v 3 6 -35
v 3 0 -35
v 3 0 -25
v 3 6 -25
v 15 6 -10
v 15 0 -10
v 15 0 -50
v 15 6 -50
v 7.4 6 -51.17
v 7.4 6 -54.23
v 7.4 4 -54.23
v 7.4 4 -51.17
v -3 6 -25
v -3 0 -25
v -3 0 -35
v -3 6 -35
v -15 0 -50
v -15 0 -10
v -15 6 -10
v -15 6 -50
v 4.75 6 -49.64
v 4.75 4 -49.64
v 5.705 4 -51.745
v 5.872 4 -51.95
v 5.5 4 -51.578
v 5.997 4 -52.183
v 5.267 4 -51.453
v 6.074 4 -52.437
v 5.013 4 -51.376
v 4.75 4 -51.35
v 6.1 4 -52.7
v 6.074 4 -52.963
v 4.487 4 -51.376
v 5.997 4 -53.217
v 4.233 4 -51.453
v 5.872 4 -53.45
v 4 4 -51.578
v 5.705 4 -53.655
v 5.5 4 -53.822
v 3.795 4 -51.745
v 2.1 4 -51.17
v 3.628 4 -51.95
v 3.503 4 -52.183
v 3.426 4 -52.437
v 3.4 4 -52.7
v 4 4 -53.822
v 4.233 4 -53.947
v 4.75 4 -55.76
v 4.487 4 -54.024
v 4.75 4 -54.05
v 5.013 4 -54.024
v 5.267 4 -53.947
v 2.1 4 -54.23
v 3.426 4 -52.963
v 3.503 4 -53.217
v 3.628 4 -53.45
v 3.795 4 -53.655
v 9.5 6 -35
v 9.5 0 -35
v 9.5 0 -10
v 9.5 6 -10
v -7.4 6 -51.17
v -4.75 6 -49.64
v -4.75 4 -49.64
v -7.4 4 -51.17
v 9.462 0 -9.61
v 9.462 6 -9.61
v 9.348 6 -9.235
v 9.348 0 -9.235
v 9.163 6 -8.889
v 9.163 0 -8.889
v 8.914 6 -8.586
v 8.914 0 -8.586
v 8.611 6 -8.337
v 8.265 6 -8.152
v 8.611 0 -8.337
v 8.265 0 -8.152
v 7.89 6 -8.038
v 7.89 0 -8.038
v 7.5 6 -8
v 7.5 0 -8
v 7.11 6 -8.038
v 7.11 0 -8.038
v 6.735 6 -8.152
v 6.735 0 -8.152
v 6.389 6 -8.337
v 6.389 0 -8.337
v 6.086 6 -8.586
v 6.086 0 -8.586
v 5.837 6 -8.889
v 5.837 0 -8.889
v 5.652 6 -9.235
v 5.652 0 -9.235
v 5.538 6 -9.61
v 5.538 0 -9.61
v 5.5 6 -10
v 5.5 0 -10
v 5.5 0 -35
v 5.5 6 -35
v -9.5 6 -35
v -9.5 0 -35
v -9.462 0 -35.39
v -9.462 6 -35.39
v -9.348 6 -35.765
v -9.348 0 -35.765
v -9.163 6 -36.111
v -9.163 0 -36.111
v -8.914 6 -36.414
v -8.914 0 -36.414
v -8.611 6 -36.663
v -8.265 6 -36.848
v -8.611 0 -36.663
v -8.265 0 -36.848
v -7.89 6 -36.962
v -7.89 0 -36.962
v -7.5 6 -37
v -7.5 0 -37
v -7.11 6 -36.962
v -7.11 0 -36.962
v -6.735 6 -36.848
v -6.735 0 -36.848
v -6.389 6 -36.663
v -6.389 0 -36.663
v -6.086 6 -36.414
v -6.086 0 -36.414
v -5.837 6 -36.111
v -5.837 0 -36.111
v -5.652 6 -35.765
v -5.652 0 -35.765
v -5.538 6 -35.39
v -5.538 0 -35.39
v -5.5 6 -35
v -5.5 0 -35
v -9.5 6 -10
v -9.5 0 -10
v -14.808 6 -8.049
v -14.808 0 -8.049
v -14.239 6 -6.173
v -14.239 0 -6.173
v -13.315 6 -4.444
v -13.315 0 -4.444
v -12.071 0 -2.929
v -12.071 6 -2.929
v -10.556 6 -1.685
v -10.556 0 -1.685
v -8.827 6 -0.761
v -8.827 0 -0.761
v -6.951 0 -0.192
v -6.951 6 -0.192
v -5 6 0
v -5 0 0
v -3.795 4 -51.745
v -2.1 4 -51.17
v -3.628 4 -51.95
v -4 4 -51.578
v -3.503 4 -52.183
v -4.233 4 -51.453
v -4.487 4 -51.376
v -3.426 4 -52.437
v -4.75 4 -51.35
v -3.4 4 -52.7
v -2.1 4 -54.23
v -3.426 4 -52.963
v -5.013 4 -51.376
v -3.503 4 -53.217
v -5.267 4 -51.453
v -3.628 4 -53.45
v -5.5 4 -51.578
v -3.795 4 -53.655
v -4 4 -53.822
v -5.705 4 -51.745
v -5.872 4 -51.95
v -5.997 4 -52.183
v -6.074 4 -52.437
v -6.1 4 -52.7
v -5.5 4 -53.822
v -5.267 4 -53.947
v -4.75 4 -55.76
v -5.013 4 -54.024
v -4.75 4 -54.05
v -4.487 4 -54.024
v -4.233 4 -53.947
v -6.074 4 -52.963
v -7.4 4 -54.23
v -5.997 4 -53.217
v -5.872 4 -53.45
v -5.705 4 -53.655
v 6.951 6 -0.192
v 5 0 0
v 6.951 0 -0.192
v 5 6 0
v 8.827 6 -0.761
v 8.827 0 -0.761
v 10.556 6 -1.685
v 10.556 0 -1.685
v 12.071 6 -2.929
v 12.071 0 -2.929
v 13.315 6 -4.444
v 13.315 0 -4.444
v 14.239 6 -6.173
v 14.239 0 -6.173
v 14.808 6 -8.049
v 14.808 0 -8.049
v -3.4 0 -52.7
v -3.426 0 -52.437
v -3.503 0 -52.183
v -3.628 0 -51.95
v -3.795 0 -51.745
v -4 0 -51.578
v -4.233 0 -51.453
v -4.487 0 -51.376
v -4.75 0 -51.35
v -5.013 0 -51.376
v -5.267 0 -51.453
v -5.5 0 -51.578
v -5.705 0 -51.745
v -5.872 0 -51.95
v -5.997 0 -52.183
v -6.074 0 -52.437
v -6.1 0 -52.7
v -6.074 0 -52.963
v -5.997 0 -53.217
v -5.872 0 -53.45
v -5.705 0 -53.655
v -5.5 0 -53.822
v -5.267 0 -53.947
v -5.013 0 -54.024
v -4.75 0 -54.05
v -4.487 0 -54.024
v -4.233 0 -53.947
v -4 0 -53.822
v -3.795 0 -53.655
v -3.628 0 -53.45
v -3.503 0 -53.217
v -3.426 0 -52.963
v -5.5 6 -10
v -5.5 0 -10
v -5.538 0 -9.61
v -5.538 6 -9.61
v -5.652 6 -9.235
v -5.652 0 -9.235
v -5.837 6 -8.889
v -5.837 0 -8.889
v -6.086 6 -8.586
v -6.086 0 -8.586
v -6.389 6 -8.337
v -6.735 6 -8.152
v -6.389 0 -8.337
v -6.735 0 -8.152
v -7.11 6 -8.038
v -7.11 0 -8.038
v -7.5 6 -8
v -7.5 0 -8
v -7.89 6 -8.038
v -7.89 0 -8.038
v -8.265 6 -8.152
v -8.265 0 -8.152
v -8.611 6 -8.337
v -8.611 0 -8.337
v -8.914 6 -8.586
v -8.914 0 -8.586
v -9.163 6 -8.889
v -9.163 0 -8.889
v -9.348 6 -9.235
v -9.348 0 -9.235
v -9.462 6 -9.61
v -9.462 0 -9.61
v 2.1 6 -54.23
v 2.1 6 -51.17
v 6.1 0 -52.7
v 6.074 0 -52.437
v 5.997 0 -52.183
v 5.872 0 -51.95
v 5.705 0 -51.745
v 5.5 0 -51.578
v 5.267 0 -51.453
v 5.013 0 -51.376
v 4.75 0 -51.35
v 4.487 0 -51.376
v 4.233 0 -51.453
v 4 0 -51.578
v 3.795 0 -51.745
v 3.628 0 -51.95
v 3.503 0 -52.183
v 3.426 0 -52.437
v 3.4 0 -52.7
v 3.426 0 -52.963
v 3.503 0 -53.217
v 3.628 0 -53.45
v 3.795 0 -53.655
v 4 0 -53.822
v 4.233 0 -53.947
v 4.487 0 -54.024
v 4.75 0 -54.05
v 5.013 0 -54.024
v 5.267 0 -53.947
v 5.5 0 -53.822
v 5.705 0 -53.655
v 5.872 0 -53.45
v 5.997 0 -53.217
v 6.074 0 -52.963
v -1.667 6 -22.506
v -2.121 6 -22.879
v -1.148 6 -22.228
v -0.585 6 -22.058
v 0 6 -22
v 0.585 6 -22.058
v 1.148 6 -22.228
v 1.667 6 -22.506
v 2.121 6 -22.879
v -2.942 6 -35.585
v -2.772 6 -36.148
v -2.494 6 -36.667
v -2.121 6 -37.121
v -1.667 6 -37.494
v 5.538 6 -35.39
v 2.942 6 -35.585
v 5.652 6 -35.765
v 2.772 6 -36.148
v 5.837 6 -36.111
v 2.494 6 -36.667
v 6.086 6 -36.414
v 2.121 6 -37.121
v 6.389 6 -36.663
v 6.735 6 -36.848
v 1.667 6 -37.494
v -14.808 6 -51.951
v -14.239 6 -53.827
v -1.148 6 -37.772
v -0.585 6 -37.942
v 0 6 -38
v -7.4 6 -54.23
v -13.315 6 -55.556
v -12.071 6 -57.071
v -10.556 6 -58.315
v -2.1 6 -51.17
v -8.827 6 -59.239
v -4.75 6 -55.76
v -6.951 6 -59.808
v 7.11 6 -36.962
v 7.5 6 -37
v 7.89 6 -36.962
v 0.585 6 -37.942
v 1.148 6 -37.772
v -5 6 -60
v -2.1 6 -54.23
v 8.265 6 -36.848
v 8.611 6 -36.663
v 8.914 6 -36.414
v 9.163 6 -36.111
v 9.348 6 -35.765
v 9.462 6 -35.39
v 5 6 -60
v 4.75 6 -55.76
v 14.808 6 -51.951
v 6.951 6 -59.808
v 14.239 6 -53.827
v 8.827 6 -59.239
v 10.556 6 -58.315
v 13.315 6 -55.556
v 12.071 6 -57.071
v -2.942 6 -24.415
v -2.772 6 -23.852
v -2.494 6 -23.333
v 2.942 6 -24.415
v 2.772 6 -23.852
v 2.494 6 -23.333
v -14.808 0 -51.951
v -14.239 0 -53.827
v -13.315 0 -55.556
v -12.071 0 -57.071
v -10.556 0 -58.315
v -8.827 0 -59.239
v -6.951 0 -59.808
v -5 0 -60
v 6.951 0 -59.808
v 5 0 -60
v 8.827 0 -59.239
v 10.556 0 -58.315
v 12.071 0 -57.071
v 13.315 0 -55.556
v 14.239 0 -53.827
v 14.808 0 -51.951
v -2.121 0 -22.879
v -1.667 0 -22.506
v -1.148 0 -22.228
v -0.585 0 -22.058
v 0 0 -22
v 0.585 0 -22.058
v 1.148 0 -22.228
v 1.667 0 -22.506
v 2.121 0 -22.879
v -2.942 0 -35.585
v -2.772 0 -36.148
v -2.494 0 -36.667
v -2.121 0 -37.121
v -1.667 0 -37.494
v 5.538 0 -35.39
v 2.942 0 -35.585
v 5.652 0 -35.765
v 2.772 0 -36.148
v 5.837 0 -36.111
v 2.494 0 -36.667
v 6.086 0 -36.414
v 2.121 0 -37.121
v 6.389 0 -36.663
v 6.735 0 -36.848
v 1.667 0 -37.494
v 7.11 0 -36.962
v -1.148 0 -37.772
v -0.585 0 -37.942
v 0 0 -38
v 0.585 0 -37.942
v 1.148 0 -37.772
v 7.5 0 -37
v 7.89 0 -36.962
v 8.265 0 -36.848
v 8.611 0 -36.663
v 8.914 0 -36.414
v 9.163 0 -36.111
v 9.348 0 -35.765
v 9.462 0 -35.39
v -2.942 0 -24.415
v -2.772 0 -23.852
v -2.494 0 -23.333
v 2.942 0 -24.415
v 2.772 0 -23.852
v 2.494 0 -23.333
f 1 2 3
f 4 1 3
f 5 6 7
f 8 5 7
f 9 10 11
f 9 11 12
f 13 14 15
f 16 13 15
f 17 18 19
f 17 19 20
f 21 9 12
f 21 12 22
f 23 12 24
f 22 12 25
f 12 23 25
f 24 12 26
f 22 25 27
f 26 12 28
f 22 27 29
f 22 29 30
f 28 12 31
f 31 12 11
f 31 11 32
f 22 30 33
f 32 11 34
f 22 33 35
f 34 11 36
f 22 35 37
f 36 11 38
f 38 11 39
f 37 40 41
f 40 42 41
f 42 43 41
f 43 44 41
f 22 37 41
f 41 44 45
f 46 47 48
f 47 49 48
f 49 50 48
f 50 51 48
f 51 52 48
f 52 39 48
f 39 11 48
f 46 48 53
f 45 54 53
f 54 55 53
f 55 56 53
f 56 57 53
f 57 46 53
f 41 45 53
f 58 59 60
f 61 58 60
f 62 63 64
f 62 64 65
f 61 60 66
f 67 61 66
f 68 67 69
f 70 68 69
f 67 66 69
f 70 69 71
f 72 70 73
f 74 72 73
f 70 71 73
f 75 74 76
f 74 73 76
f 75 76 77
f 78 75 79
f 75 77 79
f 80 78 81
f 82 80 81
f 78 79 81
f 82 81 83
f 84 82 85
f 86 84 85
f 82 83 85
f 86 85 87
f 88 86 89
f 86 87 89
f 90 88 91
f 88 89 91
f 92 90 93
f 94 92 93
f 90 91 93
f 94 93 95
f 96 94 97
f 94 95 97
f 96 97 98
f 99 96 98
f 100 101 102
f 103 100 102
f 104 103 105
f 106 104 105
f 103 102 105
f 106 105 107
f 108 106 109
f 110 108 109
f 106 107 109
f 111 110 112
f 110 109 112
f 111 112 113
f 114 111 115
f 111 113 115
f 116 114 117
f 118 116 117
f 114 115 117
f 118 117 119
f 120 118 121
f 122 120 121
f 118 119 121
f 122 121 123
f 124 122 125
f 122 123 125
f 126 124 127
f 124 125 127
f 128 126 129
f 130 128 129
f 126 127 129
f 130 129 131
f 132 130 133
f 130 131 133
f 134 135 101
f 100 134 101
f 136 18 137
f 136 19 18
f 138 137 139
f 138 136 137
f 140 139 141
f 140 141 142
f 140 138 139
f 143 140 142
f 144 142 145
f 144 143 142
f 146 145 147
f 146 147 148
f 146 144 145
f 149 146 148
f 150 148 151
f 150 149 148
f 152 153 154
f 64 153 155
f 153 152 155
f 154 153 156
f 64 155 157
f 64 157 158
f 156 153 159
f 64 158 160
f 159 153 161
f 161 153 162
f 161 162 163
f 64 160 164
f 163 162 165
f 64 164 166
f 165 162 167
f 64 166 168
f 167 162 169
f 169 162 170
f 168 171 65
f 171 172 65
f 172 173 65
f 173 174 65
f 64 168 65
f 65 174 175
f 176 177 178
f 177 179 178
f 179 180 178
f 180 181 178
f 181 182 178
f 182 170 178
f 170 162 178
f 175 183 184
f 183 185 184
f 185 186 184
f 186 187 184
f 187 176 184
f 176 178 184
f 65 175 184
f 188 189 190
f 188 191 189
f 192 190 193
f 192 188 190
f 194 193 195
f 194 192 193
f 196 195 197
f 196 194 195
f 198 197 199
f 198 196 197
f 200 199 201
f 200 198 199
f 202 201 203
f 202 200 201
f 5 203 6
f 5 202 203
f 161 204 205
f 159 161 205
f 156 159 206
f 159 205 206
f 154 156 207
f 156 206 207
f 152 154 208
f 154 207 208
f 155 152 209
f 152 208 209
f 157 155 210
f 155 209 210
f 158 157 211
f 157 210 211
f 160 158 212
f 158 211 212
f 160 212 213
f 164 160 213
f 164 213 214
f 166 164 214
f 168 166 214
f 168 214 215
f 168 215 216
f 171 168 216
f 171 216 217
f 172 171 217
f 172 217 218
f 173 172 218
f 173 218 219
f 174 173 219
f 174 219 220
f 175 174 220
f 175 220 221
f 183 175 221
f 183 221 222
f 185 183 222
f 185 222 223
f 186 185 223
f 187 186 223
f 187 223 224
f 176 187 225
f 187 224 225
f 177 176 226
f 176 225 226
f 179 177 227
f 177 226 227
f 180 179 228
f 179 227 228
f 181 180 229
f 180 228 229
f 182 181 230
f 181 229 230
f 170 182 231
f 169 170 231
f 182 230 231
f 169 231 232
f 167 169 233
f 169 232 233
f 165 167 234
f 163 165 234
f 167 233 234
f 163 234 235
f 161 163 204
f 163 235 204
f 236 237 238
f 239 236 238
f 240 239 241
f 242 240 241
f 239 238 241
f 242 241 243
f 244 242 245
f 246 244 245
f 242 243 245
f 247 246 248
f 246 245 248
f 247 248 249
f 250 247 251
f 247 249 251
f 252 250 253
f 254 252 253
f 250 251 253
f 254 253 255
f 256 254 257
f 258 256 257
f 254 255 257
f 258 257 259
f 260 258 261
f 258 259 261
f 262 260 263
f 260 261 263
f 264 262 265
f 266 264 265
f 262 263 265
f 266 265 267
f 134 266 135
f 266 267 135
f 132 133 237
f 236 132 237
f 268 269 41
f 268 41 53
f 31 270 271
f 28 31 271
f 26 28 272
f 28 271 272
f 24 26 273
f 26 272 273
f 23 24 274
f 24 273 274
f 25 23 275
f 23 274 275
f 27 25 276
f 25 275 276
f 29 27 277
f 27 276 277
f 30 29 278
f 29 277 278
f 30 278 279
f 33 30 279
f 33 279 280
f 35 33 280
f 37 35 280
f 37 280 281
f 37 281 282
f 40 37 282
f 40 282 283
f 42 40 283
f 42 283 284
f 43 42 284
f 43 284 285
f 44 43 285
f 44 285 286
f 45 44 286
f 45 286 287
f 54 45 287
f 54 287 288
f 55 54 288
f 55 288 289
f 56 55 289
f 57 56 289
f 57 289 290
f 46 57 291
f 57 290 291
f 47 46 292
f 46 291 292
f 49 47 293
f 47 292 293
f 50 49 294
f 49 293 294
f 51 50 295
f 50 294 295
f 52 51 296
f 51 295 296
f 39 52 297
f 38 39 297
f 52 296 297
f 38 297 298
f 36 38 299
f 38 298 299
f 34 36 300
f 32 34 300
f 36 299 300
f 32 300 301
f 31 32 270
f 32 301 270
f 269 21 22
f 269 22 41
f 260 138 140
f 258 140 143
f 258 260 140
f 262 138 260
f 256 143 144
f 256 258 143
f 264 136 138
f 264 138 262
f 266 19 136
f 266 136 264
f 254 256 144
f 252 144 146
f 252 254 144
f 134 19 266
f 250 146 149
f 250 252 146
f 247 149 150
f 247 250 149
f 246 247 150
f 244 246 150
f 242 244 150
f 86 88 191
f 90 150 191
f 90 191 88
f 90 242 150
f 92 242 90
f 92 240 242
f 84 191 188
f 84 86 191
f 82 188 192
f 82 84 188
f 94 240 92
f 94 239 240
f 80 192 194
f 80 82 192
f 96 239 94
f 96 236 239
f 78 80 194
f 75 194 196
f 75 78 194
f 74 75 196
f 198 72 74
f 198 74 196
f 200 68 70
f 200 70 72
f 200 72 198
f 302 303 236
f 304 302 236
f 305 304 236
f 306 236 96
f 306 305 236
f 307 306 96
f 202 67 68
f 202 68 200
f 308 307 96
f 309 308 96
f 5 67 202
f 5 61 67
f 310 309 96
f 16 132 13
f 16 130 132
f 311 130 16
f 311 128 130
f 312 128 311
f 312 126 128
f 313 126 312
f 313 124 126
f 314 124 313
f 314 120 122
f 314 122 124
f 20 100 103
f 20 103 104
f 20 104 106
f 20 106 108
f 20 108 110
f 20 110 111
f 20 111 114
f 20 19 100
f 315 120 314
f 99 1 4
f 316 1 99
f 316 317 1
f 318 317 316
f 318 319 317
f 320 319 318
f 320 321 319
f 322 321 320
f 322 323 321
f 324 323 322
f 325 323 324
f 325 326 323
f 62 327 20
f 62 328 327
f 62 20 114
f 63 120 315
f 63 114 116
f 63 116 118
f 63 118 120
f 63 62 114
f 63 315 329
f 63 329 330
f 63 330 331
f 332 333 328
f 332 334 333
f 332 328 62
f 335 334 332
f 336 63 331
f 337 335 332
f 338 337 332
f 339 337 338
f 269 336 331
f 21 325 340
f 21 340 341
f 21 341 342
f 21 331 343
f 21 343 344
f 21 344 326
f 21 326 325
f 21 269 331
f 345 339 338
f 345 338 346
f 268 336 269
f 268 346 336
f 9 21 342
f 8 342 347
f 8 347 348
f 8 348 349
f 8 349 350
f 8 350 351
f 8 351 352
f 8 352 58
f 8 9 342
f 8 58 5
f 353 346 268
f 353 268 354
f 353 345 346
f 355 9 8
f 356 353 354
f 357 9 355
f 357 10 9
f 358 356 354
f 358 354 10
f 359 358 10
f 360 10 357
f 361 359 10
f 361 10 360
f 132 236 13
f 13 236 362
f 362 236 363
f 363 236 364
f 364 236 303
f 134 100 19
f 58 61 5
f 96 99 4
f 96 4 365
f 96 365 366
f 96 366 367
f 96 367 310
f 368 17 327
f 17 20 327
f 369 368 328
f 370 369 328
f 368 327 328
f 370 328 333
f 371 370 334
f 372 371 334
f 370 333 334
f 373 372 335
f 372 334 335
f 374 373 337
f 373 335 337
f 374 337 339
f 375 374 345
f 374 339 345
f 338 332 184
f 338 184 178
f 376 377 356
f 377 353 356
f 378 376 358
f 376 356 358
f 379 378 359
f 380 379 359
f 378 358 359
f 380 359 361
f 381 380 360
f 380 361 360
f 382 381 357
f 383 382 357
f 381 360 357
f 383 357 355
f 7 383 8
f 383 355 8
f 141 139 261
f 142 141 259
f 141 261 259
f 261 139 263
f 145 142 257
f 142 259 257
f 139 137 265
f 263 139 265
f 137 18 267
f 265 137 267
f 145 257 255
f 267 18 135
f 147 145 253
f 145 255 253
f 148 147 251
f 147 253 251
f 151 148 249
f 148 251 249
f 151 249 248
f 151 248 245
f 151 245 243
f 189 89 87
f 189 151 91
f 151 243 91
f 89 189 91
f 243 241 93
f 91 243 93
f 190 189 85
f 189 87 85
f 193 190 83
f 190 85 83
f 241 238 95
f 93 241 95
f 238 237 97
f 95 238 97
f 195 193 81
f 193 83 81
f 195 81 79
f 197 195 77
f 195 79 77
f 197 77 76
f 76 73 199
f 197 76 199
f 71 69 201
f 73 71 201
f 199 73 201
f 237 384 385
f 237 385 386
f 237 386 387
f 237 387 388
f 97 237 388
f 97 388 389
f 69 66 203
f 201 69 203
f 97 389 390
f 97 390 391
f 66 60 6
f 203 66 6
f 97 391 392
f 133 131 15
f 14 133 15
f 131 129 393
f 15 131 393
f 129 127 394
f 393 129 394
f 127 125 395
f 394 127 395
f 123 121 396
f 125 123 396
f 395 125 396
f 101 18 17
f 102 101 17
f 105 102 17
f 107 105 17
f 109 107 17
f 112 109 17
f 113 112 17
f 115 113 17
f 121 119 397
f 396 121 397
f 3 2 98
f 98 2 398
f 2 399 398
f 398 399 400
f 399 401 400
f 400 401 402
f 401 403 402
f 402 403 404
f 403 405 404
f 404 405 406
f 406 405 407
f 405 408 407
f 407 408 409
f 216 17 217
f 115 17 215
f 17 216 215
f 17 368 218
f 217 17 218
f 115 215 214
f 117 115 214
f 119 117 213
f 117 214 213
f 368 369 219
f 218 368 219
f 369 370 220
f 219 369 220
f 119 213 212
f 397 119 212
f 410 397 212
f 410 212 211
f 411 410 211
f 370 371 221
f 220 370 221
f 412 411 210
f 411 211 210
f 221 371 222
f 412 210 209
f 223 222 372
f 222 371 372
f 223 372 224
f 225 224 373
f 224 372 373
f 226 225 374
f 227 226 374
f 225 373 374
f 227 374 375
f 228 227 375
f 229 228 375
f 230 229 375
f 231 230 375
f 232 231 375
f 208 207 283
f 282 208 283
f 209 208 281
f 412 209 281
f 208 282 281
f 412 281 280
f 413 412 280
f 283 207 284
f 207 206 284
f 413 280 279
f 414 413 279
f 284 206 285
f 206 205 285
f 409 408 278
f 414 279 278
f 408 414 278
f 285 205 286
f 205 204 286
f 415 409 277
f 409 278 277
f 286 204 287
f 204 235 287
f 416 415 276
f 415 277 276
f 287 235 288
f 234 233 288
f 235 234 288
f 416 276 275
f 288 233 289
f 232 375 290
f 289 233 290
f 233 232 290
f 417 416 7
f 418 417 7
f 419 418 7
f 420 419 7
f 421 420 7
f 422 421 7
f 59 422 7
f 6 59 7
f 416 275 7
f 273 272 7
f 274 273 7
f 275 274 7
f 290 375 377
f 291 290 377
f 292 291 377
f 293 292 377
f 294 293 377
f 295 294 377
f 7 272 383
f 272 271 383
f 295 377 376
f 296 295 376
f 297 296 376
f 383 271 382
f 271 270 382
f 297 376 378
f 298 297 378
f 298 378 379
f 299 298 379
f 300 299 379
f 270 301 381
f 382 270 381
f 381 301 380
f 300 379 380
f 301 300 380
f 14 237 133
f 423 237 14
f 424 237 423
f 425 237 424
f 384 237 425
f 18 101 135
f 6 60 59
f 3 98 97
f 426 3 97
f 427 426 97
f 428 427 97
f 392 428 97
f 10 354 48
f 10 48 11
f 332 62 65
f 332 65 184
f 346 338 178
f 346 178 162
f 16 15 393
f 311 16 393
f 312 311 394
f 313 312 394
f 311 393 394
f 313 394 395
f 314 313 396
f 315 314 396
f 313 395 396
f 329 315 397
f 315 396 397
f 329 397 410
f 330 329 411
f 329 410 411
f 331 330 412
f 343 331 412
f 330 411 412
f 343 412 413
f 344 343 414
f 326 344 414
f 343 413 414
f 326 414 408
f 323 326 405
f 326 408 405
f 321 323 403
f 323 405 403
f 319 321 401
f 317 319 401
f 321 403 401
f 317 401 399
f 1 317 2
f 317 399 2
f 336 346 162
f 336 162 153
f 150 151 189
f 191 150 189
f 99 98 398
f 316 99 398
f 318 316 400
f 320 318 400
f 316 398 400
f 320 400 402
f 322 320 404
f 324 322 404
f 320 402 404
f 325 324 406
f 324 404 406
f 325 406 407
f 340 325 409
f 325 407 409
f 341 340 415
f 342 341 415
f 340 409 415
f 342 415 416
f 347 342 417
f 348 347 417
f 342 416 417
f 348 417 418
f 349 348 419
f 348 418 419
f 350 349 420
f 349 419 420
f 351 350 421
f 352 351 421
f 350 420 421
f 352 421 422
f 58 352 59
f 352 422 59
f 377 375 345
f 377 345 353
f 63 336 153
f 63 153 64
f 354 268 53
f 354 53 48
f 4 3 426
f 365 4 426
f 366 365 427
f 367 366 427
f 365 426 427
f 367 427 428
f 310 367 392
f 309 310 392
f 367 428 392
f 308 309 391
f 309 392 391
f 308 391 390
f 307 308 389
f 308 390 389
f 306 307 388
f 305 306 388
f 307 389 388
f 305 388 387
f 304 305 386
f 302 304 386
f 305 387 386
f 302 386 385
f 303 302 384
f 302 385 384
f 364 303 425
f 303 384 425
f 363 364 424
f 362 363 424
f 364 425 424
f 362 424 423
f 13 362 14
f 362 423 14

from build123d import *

# Parameters (mm, degrees)
CROQUIS2_W              = 30
CROQUIS2_H              = 60
SALIENTE_EXTRUIR1_DEPTH = 6
REDONDEO1_R             = 10
REDONDEO2_R             = 10
CROQUIS3_R              = 1.35
CORTAR_EXTRUIR1_DEPTH   = 7
CORTAR_EXTRUIR2_DEPTH   = 2


with BuildPart() as part:
    # Croquis2 → Saliente-Extruir1 (new body)
    with BuildSketch(Plane(origin=(0, 0, 0), x_dir=(1, 0, 0), z_dir=(0, 1, 0))):
        with Locations((0, 30)):
            Rectangle(CROQUIS2_W, CROQUIS2_H)
        with BuildLine():
            Line((-5.5, 35), (-5.5, 10))
            ThreePointArc((-5.5, 10), (-7.5, 8), (-9.5, 10))
            Line((-9.5, 10), (-9.5, 35))
            ThreePointArc((-9.5, 35), (-7.5, 37), (-5.5, 35))
        make_face(mode=Mode.SUBTRACT)
        with BuildLine():
            Line((9.5, 35), (9.5, 10))
            ThreePointArc((9.5, 10), (7.5, 8), (5.5, 10))
            Line((5.5, 10), (5.5, 35))
            ThreePointArc((5.5, 35), (7.5, 37), (9.5, 35))
        make_face(mode=Mode.SUBTRACT)
        with BuildLine():
            Line((3, 35), (3, 25))
            ThreePointArc((3, 25), (0, 22), (-3, 25))
            Line((-3, 25), (-3, 35))
            ThreePointArc((-3, 35), (0, 38), (3, 35))
        make_face(mode=Mode.SUBTRACT)
    extrude(amount=SALIENTE_EXTRUIR1_DEPTH)

    # Redondeo1
    redondeo1_edges = [part.edges().sort_by_distance(p)[0] for p in [
        (-15, 3, -60),
        (15, 3, -60),
    ]]
    fillet(redondeo1_edges, radius=REDONDEO1_R)

    # Redondeo2
    redondeo2_edges = [part.edges().sort_by_distance(p)[0] for p in [
        (15, 3, 0),
        (-15, 3, 0),
    ]]
    fillet(redondeo2_edges, radius=REDONDEO2_R)

    # Croquis3 → Cortar-Extruir1 (cut, through all)
    with BuildSketch(Plane.XZ):
        with Locations((4.75, -52.7)):
            Circle(CROQUIS3_R)
        with Locations((-4.75, -52.7)):
            Circle(CROQUIS3_R)
    extrude(amount=-CORTAR_EXTRUIR1_DEPTH, mode=Mode.SUBTRACT)

    # Croquis4 → Cortar-Extruir2 (cut)
    with BuildSketch(Plane(origin=(0, 6, 0), x_dir=(-1, 0, 0), z_dir=(0, -1, 0))):
        Polygon((-2.1, 51.170021787), (-2.1, 54.229978213), (-4.75, 55.759956427), (-7.4, 54.229978213), (-7.4, 51.170021787), (-4.75, 49.640043573), align=None)
        Polygon((7.4, 51.170021787), (7.4, 54.229978213), (4.75, 55.759956427), (2.1, 54.229978213), (2.1, 51.170021787), (4.75, 49.640043573), align=None)
    extrude(amount=CORTAR_EXTRUIR2_DEPTH, mode=Mode.SUBTRACT)


solid = part.part
